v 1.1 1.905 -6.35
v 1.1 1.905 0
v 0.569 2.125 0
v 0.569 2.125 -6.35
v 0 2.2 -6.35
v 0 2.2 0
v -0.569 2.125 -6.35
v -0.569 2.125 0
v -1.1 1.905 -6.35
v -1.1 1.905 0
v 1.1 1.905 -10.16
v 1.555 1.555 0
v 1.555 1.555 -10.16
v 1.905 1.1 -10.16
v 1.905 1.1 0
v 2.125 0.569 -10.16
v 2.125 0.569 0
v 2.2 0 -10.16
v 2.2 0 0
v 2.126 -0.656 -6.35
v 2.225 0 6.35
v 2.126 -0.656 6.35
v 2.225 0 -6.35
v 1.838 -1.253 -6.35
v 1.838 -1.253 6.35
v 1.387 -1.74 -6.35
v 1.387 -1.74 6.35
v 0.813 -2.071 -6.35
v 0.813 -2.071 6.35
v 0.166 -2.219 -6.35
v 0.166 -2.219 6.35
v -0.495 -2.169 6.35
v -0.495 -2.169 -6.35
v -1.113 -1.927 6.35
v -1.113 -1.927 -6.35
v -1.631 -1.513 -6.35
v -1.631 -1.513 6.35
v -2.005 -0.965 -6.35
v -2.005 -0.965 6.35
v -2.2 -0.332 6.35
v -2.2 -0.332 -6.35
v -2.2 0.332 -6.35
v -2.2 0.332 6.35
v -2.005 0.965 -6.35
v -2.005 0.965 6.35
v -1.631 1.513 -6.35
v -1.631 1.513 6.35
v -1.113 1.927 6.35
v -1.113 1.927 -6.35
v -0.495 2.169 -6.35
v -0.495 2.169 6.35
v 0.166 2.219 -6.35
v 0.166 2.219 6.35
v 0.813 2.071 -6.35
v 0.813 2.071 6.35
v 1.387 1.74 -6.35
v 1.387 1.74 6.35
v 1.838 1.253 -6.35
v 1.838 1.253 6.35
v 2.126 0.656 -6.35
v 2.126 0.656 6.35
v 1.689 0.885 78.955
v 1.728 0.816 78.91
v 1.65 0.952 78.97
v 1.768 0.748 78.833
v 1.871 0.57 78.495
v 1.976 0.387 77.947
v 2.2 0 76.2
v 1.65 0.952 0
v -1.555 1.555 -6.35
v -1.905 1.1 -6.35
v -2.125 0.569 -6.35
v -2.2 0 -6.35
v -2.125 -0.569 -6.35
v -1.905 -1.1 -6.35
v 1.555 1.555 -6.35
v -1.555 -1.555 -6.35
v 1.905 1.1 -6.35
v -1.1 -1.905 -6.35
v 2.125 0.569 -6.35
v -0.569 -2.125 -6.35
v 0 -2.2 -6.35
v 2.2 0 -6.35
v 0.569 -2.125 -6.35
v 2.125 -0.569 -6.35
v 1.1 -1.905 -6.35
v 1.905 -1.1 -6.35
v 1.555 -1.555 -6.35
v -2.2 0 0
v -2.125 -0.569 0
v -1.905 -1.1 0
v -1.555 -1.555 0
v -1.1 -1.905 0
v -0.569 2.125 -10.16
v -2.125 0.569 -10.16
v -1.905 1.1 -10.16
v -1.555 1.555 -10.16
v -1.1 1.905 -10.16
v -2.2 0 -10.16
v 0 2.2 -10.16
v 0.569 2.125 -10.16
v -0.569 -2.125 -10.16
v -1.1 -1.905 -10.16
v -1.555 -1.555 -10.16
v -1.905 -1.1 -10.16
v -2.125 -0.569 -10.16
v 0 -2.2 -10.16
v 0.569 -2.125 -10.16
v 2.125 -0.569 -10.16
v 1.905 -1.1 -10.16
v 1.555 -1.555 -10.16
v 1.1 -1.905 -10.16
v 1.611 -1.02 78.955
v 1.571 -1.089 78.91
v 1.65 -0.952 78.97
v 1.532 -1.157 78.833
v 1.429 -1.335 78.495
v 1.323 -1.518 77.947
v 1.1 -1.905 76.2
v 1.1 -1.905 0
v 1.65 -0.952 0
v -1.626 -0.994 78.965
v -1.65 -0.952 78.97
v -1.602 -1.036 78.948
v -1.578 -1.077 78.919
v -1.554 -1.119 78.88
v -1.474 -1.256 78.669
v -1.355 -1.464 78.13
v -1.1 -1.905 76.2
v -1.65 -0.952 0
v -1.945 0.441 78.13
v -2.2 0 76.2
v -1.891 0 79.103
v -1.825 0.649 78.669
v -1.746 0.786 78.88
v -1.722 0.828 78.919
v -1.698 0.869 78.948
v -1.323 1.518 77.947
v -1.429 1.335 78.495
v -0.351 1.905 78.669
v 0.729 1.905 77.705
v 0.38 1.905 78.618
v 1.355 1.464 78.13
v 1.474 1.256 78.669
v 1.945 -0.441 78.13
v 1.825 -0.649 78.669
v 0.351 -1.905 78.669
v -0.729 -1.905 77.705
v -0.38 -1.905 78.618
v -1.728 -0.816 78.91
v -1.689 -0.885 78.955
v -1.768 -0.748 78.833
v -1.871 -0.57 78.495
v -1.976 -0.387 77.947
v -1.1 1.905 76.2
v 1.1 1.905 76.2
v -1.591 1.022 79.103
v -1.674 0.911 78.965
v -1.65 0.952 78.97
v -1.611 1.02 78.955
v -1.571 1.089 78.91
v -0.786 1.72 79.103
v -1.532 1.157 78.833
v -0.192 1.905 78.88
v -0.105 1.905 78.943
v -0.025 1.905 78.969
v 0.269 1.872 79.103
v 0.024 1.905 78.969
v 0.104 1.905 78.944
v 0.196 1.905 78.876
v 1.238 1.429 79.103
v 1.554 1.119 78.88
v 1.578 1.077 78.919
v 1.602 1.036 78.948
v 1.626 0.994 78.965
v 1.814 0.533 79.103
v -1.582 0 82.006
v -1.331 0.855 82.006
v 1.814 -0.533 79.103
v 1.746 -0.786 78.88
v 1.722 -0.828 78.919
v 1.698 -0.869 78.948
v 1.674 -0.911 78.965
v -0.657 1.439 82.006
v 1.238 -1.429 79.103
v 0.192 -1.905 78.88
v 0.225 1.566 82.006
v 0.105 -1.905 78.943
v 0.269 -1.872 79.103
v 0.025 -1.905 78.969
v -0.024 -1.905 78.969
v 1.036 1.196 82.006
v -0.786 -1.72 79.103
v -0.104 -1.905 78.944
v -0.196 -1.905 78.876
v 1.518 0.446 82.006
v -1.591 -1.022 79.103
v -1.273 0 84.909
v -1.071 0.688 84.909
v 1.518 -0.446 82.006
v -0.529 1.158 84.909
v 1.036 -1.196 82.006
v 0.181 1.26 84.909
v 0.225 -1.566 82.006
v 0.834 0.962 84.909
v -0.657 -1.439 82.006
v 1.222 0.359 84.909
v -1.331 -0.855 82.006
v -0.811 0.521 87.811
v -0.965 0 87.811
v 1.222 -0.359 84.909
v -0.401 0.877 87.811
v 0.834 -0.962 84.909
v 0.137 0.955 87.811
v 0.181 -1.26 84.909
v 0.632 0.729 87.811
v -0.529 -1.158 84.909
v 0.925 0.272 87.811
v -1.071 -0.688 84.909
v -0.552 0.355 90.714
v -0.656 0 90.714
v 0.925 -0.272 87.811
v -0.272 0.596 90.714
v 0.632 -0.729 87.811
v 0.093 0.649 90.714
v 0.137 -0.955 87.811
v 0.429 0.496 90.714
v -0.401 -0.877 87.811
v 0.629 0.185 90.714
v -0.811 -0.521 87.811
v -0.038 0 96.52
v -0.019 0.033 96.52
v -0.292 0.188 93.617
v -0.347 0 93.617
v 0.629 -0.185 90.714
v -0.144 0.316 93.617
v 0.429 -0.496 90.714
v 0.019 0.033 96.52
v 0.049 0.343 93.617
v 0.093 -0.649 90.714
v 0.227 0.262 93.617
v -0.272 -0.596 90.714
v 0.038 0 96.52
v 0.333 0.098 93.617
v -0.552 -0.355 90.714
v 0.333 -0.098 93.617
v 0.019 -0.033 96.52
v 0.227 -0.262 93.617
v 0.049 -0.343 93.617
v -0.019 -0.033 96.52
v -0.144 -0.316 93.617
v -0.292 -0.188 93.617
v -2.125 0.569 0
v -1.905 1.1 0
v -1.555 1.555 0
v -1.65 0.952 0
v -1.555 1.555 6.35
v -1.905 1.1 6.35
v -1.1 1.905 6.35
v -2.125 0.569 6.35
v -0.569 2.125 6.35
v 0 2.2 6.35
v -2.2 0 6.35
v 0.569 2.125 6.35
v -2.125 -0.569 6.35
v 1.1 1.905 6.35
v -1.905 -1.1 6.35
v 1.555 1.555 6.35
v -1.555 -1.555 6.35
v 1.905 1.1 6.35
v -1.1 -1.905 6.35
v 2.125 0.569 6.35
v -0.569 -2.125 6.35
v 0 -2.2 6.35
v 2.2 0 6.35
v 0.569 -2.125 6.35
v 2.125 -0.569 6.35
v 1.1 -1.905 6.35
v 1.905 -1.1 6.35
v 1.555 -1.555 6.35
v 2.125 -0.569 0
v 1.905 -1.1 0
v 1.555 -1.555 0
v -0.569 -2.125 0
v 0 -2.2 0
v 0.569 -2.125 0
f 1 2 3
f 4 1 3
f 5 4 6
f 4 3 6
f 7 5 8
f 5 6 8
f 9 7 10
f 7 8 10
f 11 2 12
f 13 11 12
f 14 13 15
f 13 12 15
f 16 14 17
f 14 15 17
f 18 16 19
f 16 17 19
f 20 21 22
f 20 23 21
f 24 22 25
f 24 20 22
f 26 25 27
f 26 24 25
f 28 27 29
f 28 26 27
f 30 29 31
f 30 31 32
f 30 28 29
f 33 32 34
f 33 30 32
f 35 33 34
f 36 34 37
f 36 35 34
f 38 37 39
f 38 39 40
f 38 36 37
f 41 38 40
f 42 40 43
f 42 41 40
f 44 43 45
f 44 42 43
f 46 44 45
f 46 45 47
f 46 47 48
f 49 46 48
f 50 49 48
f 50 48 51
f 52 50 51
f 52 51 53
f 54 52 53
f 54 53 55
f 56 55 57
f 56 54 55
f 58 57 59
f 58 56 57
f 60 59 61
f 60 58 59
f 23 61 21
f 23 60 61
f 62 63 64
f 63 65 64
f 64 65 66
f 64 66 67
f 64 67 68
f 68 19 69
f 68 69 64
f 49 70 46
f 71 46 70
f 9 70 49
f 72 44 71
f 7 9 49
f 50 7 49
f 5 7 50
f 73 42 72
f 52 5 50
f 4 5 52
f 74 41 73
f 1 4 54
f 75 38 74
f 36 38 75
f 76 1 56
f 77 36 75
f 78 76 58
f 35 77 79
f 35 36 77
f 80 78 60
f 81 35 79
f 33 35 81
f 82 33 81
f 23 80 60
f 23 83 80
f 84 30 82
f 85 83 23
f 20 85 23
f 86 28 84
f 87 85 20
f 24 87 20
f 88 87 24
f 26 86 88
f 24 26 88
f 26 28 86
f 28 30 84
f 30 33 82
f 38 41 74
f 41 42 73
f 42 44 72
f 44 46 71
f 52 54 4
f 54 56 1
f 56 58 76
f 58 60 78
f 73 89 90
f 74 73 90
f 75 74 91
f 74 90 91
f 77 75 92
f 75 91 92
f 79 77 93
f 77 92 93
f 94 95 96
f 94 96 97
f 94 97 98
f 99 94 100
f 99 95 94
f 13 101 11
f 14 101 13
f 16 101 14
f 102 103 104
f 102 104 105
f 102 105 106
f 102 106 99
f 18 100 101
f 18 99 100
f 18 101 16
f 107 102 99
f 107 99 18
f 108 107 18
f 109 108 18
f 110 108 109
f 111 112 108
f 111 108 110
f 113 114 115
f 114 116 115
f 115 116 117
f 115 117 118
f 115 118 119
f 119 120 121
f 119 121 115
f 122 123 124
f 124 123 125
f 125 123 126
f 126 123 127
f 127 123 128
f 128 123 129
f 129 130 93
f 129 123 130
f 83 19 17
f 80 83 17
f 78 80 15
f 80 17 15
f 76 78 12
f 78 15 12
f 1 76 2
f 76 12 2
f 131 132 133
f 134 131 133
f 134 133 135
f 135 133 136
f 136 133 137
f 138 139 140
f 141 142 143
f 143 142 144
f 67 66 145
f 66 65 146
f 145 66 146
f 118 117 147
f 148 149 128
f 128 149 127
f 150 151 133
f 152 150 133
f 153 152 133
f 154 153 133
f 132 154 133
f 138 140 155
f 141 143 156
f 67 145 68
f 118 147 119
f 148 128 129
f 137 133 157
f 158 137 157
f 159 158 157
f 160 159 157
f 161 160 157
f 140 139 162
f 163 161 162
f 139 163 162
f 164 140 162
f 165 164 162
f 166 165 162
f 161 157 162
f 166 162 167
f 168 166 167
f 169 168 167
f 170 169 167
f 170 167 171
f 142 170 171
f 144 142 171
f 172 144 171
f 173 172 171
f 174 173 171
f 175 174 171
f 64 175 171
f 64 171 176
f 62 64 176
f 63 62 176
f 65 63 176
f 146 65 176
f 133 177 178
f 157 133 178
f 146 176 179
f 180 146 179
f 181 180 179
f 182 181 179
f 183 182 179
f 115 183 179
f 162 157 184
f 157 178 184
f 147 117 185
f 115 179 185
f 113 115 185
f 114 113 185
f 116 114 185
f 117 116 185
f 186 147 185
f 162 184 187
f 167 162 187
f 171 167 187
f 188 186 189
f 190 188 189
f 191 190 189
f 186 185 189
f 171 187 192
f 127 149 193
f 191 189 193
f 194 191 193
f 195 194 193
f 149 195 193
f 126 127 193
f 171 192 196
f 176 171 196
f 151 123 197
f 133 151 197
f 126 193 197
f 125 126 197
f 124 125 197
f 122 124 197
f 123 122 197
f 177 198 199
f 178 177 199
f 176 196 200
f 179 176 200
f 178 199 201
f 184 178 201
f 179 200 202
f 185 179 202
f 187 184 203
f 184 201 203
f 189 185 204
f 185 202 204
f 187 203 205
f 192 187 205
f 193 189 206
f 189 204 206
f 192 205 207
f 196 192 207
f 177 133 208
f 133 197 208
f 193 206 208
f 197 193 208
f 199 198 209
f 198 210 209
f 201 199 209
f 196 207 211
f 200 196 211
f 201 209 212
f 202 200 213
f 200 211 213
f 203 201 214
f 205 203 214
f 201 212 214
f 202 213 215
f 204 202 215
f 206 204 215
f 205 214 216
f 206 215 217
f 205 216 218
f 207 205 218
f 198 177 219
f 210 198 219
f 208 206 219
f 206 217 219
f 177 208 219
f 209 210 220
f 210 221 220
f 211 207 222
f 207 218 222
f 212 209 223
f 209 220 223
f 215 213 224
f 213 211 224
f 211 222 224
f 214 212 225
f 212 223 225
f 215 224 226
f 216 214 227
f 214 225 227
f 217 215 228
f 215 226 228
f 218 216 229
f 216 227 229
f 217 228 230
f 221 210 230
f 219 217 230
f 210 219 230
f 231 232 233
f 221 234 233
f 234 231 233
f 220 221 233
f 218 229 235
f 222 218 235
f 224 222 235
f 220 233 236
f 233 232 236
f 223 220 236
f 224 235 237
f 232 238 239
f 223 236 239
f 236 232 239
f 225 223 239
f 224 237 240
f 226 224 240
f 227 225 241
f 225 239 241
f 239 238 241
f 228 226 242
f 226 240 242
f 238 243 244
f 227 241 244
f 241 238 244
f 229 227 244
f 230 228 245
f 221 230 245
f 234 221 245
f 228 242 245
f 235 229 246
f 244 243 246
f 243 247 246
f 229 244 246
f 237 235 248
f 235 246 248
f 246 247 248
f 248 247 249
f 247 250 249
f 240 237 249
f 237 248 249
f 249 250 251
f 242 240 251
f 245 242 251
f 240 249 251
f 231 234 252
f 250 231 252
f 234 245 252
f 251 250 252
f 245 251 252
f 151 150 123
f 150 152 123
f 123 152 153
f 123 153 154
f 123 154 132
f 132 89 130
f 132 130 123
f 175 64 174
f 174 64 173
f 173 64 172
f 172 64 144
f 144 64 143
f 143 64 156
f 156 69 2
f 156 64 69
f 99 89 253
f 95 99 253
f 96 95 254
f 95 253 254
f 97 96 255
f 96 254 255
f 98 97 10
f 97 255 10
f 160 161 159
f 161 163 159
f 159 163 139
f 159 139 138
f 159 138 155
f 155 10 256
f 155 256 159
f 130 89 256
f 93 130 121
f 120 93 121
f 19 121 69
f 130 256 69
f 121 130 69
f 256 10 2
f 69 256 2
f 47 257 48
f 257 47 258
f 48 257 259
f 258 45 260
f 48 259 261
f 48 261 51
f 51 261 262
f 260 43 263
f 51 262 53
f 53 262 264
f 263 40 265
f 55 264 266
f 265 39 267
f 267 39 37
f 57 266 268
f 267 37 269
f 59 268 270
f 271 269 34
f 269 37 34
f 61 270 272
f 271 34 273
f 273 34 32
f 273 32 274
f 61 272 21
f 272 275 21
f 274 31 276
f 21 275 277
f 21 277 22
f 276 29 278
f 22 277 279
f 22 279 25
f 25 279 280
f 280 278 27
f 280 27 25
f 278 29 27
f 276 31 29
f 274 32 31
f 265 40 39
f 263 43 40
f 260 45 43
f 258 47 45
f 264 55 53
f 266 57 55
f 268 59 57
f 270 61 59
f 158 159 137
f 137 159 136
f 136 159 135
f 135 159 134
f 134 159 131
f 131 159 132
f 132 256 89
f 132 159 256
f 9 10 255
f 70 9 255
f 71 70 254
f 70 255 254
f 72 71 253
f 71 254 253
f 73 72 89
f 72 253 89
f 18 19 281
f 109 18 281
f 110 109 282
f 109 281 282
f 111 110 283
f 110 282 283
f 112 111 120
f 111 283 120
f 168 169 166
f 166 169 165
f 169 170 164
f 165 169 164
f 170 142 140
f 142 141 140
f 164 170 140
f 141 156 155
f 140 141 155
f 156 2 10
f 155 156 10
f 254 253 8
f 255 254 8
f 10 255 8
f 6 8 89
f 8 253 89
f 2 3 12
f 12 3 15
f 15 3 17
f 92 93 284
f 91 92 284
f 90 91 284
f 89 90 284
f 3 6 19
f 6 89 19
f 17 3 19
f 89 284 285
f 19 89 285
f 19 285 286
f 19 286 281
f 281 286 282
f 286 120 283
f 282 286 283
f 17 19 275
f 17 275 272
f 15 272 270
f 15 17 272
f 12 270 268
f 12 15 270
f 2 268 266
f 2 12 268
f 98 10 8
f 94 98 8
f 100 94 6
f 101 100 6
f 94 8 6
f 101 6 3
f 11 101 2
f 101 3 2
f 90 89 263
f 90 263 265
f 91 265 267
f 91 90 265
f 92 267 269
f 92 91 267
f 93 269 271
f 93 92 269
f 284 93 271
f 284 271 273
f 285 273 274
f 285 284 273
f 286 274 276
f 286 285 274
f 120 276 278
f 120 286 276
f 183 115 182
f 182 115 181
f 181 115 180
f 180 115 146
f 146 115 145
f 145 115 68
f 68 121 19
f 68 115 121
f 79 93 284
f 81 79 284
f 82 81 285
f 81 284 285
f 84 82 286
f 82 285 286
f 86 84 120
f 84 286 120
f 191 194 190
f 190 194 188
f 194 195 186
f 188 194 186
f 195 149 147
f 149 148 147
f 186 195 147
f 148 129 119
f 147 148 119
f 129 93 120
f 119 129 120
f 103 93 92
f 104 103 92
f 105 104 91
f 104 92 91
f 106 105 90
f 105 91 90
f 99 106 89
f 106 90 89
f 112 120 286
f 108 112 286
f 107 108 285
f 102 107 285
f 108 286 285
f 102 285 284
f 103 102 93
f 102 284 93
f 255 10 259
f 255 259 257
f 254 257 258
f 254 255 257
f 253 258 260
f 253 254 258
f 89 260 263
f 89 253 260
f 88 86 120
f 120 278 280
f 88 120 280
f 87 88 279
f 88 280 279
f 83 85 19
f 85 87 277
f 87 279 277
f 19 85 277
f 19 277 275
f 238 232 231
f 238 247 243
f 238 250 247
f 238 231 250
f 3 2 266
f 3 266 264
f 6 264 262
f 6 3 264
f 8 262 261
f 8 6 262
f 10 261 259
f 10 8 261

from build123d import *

# Parameters (mm, degrees)
F1_DEPTH = 76.2
F2_DEPTH = 20.32
F6_R     = 2.2251045256
F7_DEPTH = 6.35
F8_DEPTH = 10.16


with BuildPart() as f1:
    # F0 (on Top) → F1 (new body)
    with BuildSketch(Plane.XY):
        with BuildLine():
            ThreePointArc((1.6497784004, -0.9524999894), (1.8400887007, -0.493050275), (1.905, 0))
            ThreePointArc((1.905, 0), (1.8400887022, 0.4930502693), (1.6497784063, 0.9524999791))
            ThreePointArc((1.6497784063, 0.9524999791), (0.9525000104, 1.6497783882), (0, 1.905))
            ThreePointArc((0, 1.905), (-0.9525000104, 1.6497783882), (-1.6497784063, 0.9524999791))
            ThreePointArc((-1.6497784063, 0.9524999791), (-1.905, 0), (-1.6497784063, -0.9524999791))
            ThreePointArc((-1.6497784063, -0.9524999791), (-0.9525000104, -1.6497783882), (0, -1.905))
            ThreePointArc((0, -1.905), (0.9525000053, -1.6497783911), (1.6497784004, -0.9524999894))
        make_face()
        with BuildLine():
            ThreePointArc((-1.6497784063, 0.9524999791), (-0.9525000104, 1.6497783882), (0, 1.905))
            Line((0, 1.905), (-1.0998522628, 1.905))
            Line((-1.0998522628, 1.905), (-1.6497784063, 0.9524999791))
        make_face()
        with BuildLine():
            ThreePointArc((-1.6497784063, -0.9524999791), (-1.905, 0), (-1.6497784063, 0.9524999791))
            Line((-1.6497784063, 0.9524999791), (-2.1997045256, 0))
            Line((-2.1997045256, 0), (-1.6497784063, -0.9524999791))
        make_face()
        with BuildLine():
            Line((-1.0998522628, -1.905), (0, -1.905))
            ThreePointArc((0, -1.905), (-0.9525000104, -1.6497783882), (-1.6497784063, -0.9524999791))
            Line((-1.6497784063, -0.9524999791), (-1.0998522628, -1.905))
        make_face()
        with BuildLine():
            Line((1.0998522628, -1.905), (1.6497784004, -0.9524999894))
            ThreePointArc((1.6497784004, -0.9524999894), (0.9525000053, -1.6497783911), (0, -1.905))
            Line((0, -1.905), (1.0998522628, -1.905))
        make_face()
        with BuildLine():
            ThreePointArc((1.6497784063, 0.9524999791), (1.8400887022, 0.4930502693), (1.905, 0))
            ThreePointArc((1.905, 0), (1.8400887007, -0.493050275), (1.6497784004, -0.9524999894))
            Line((1.6497784004, -0.9524999894), (2.1997045256, 0))
            Line((2.1997045256, 0), (1.6497784063, 0.9524999791))
        make_face()
        with BuildLine():
            ThreePointArc((0, 1.905), (0.9525000104, 1.6497783882), (1.6497784063, 0.9524999791))
            Line((1.6497784063, 0.9524999791), (1.0998522628, 1.905))
            Line((1.0998522628, 1.905), (0, 1.905))
        make_face()
    extrude(amount=F1_DEPTH)

    # F2 (add): a face of the model
    f2_faces = [f1.faces().sort_by_distance(p)[0] for p in [
        (0, 0, 76.2),
    ]]
    extrude(f2_faces, amount=F2_DEPTH)

    # F3 (on Front) → F5 (revolve, cut)
    with BuildSketch(Plane.XZ):
        Polygon((-2.1997045256, 96.52), (-2.1997045256, 76.2), (-0.0381645256, 96.52), align=None)
    revolve(axis=Axis((0, 0, 48.3170896769), (0, 0, -1)), mode=Mode.SUBTRACT)


with BuildPart() as f7:
    # F6 (on face) → F7 (new body, symmetric)
    with BuildSketch(Plane(origin=(0, 0, 0), x_dir=(1, 0, 0), z_dir=(0, 0, -1))):
        Circle(F6_R)
        with BuildLine():
            ThreePointArc((1.0998522628, 1.905), (1.905, 1.0998522628), (2.1997045256, 0))
            ThreePointArc((2.1997045256, 0), (1.905, -1.0998522628), (1.0998522628, -1.905))
            ThreePointArc((1.0998522628, -1.905), (0, -2.1997045256), (-1.0998522628, -1.905))
            ThreePointArc((-1.0998522628, -1.905), (-1.905, -1.0998522628), (-2.1997045256, 0))
            ThreePointArc((-2.1997045256, 0), (-1.905, 1.0998522628), (-1.0998522628, 1.905))
            ThreePointArc((-1.0998522628, 1.905), (0, 2.1997045256), (1.0998522628, 1.905))
        make_face(mode=Mode.SUBTRACT)
    extrude(amount=F7_DEPTH, both=True)


with BuildPart() as f8:
    # F6 (on face) → F8 (new body)
    with BuildSketch(Plane(origin=(0, 0, 0), x_dir=(1, 0, 0), z_dir=(0, 0, -1))):
        with BuildLine():
            ThreePointArc((1.0998522628, -1.905), (1.905, -1.0998522628), (2.1997045256, 0))
            Line((2.1997045256, 0), (1.0998522628, -1.905))
        make_face()
        with BuildLine():
            ThreePointArc((-1.0998522628, -1.905), (0, -2.1997045256), (1.0998522628, -1.905))
            Line((1.0998522628, -1.905), (-1.0998522628, -1.905))
        make_face()
        Polygon((1.0998522628, -1.905), (2.1997045256, 0), (1.0998522628, 1.905), (-1.0998522628, 1.905), (-2.1997045256, 0), (-1.0998522628, -1.905), align=None)
        with BuildLine():
            ThreePointArc((-2.1997045256, 0), (-1.905, -1.0998522628), (-1.0998522628, -1.905))
            Line((-1.0998522628, -1.905), (-2.1997045256, 0))
        make_face()
        with BuildLine():
            Line((-2.1997045256, 0), (-1.0998522628, 1.905))
            ThreePointArc((-1.0998522628, 1.905), (-1.905, 1.0998522628), (-2.1997045256, 0))
        make_face()
        with BuildLine():
            Line((1.0998522628, 1.905), (2.1997045256, 0))
            ThreePointArc((2.1997045256, 0), (1.905, 1.0998522628), (1.0998522628, 1.905))
        make_face()
        with BuildLine():
            Line((-1.0998522628, 1.905), (1.0998522628, 1.905))
            ThreePointArc((1.0998522628, 1.905), (0, 2.1997045256), (-1.0998522628, 1.905))
        make_face()
    extrude(amount=F8_DEPTH)


solid = Compound([f1.part, f7.part, f8.part])
